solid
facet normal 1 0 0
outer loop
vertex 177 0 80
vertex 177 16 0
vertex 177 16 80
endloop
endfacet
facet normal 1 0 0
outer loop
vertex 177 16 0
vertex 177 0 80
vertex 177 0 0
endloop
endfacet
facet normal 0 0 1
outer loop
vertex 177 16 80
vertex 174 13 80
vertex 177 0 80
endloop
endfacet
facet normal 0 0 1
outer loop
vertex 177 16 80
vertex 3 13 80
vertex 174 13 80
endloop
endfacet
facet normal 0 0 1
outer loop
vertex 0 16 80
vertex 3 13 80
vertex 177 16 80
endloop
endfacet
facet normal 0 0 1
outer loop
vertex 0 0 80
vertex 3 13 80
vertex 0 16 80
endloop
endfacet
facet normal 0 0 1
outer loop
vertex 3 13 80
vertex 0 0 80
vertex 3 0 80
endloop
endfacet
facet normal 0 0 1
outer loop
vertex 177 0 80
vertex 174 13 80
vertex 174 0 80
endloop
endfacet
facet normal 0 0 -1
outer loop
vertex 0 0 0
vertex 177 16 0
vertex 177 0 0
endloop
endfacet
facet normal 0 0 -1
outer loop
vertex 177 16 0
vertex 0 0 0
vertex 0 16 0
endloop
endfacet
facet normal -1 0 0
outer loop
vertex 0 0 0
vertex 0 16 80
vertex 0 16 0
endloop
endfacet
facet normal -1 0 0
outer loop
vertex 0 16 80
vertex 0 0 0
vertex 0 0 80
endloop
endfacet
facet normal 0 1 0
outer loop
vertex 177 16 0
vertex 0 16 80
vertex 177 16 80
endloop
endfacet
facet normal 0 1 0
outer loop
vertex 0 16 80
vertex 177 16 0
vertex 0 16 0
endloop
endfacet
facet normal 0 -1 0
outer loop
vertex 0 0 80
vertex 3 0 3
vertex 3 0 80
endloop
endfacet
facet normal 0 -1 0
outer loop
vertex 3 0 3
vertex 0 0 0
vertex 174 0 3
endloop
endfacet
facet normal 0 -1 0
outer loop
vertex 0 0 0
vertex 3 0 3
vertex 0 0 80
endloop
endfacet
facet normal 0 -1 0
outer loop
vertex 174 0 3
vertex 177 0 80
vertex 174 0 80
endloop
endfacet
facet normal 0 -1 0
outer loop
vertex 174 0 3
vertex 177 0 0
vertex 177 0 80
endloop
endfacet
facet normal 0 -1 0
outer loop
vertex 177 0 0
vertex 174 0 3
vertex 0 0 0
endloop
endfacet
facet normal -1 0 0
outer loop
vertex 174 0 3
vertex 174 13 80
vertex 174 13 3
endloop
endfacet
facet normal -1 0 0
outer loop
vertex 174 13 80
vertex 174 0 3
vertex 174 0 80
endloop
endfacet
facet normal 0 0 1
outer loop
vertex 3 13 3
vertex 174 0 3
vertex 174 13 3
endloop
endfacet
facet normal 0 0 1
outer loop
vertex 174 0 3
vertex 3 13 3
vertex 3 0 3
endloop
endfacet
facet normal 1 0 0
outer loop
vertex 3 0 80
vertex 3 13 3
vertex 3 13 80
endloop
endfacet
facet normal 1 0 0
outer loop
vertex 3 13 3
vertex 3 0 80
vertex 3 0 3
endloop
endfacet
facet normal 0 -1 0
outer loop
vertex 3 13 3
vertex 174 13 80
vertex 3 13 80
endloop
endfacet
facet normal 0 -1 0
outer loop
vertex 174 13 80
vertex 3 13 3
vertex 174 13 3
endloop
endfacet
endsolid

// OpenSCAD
//Hoehe Handy
h=171;
//Breite Handy
b=77;
//Tiefe Handy
th=13;

//Thickness
t=3;

difference() {
    cube([h+t+t, th+t, b+t]);
    translate([t,0,t])
    color("gray")
    cube([h, th, b]);
}
